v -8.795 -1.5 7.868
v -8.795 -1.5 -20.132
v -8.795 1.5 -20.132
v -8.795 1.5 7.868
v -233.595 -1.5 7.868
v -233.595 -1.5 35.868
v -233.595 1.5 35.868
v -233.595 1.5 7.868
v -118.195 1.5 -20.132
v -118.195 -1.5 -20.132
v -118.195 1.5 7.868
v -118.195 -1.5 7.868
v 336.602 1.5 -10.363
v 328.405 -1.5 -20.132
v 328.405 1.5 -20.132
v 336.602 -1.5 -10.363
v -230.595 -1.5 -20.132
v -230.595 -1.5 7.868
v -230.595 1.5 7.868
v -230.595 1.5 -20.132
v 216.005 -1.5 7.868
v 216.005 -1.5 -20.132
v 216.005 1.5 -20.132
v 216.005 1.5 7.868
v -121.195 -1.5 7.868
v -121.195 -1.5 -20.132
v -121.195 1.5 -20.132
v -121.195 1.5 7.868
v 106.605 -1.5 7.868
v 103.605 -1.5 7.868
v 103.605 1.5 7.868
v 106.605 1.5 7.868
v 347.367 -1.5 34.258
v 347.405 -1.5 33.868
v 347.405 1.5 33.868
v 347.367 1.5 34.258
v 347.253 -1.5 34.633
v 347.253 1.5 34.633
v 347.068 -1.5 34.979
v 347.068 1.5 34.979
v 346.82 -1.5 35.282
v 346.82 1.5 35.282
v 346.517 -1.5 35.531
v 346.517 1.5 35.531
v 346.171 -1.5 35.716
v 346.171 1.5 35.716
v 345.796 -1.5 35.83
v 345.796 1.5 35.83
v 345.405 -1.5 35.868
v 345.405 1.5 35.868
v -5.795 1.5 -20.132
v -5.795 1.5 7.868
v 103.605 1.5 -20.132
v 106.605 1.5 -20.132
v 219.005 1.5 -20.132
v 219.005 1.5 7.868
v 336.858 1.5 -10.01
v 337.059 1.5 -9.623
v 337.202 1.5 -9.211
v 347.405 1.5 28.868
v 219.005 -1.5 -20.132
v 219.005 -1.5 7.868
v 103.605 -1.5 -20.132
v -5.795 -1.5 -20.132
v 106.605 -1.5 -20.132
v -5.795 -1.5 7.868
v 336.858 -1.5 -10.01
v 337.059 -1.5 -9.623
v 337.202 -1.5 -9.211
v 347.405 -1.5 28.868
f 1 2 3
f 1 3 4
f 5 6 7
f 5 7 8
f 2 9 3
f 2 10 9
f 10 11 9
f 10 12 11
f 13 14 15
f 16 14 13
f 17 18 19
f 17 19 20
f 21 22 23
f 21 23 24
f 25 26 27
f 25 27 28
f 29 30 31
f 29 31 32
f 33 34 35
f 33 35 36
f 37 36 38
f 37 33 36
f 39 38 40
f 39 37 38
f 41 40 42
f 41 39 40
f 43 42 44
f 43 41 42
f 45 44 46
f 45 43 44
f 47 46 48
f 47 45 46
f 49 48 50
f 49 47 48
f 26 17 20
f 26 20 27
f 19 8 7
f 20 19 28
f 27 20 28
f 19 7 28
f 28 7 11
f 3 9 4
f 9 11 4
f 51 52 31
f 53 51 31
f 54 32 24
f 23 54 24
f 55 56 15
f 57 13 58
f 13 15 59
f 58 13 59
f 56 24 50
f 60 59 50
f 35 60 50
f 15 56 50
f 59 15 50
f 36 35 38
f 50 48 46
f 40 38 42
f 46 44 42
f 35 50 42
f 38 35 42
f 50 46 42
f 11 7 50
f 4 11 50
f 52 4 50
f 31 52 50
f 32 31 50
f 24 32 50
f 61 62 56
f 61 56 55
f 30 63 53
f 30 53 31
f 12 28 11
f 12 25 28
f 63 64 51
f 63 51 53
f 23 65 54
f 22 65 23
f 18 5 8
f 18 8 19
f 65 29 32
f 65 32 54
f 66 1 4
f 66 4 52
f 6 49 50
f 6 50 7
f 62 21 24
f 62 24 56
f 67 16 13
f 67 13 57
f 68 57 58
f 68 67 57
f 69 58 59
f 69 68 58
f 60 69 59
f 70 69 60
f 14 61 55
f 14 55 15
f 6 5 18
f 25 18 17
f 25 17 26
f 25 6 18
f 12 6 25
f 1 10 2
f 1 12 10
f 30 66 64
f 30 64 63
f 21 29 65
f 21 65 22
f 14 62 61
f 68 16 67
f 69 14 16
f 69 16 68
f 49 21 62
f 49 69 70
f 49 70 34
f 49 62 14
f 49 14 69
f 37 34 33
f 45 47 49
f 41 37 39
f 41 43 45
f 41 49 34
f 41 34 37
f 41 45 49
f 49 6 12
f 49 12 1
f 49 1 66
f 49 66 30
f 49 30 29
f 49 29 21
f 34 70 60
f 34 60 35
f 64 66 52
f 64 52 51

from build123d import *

# Parameters (mm, degrees)
F1_DEPTH = 1.5


with BuildPart() as f1:
    # F0 (on Front) → F1 (new body, symmetric)
    with BuildSketch(Plane.XZ):
        with BuildLine():
            Line((-118.194595, -20.131947), (-12.594595, -20.131947))
            Line((-12.594595, -20.131947), (-8.794595, -20.131947))
            Line((-8.794595, -20.131947), (-8.794595, 7.868053))
            Line((-8.794595, 7.868053), (-5.794595, 7.868053))
            Line((-5.794595, 7.868053), (-5.794595, -20.131947))
            Line((-5.794595, -20.131947), (103.605405, -20.131947))
            Line((103.605405, -20.131947), (103.605405, 7.868053))
            Line((103.605405, 7.868053), (106.605405, 7.868053))
            Line((106.605405, 7.868053), (106.605405, -20.131947))
            Line((106.605405, -20.131947), (216.005405, -20.131947))
            Line((216.005405, -20.131947), (216.005405, 7.868053))
            Line((216.005405, 7.868053), (219.005405, 7.868053))
            Line((219.005405, 7.868053), (219.005405, -20.131947))
            Line((219.005405, -20.131947), (328.405405, -20.131947))
            Line((328.405405, -20.131947), (336.602465, -10.363072))
            ThreePointArc((336.602465, -10.363072), (336.965365, -9.819955), (337.20211, -9.211166))
            Line((337.20211, -9.211166), (347.405405, 28.868053))
            Line((347.405405, 28.868053), (347.405405, 33.868053))
            ThreePointArc((347.405405, 33.868053), (346.819619, 35.282266), (345.405405, 35.868053))
            Line((345.405405, 35.868053), (-12.594595, 35.868053))
            Line((-12.594595, 35.868053), (-233.594595, 35.868053))
            Line((-233.594595, 35.868053), (-233.594595, 7.868053))
            Line((-233.594595, 7.868053), (-230.594595, 7.868053))
            Line((-230.594595, 7.868053), (-230.594595, -20.131947))
            Line((-230.594595, -20.131947), (-121.194595, -20.131947))
            Line((-121.194595, -20.131947), (-121.194595, 7.868053))
            Line((-121.194595, 7.868053), (-118.194595, 7.868053))
            Line((-118.194595, 7.868053), (-118.194595, -20.131947))
        make_face()
    extrude(amount=F1_DEPTH, both=True)


solid = f1.part
